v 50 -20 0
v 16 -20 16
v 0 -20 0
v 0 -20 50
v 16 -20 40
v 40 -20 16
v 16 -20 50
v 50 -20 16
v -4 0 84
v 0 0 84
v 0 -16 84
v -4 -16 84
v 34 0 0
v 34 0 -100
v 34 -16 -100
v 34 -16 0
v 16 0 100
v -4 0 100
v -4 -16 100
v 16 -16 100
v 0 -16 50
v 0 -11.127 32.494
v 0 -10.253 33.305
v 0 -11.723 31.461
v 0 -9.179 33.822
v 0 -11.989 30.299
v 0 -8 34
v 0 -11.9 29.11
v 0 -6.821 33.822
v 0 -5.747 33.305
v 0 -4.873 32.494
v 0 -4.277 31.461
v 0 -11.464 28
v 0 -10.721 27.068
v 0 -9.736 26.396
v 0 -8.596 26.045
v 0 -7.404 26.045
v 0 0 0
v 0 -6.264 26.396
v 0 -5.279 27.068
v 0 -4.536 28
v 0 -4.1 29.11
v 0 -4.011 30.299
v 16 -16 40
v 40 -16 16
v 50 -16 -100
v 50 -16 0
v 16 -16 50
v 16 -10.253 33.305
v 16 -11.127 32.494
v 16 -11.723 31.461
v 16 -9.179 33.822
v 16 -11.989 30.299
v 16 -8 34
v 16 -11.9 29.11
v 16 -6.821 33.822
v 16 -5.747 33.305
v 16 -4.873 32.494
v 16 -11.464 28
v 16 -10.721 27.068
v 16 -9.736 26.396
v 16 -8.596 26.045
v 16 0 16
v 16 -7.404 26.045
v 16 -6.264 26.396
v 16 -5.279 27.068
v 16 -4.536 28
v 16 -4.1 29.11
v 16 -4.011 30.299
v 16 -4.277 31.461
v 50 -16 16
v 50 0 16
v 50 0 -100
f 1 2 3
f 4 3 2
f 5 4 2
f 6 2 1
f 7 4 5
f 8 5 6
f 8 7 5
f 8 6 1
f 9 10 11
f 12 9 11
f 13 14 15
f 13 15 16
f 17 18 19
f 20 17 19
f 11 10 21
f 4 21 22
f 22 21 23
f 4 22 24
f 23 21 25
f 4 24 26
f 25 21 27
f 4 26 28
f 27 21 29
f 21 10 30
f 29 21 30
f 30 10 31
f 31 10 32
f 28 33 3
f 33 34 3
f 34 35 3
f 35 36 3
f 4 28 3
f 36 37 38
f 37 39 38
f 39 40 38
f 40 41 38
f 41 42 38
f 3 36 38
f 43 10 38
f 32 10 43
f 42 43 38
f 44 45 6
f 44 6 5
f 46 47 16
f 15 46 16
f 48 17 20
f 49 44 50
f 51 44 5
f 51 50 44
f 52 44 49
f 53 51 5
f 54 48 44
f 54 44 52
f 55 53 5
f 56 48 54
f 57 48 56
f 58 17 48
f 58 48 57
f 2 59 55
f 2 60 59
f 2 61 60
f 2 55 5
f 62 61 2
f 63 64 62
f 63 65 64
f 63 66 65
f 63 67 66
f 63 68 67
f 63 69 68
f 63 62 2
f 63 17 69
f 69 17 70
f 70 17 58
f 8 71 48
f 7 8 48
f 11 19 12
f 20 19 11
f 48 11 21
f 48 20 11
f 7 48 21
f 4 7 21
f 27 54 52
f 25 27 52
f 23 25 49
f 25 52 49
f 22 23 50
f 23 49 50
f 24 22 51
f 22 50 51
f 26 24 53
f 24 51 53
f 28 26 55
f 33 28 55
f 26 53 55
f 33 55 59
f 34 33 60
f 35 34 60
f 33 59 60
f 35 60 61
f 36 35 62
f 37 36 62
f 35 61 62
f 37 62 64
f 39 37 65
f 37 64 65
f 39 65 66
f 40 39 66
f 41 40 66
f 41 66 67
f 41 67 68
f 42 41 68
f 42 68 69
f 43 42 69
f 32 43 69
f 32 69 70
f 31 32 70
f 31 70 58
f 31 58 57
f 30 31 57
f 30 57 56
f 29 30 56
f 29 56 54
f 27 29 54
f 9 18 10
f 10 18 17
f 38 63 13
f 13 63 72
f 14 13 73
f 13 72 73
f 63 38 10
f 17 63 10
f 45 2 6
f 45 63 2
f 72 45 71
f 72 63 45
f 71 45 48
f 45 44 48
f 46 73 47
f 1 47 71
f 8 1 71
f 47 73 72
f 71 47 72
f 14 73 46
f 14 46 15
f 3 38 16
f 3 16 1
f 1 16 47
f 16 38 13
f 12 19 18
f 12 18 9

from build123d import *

# Parameters (mm, degrees)
PAD_DEPTH    = 16
PAD001_DEPTH = 4
SKETCH002_R  = 4
POCKET_DEPTH = 16.001
SKETCH003_W  = 16
SKETCH003_H  = 16
PAD002_DEPTH = 4


with BuildPart() as part:
    # Sketch → Pad (new body)
    with BuildSketch(Plane.XZ):
        Polygon((0, 0), (0, 100), (16, 100), (16, 16), (50, 16), (50, -100), (34, -100), (34, 0), align=None)
    extrude(amount=PAD_DEPTH)

    # Sketch001 (on Face10 of Pad) → Pad001 (join)
    with BuildSketch(Plane.XZ.offset(16)):
        Polygon((0, 0), (50, 0), (50, 16), (16, 50), (0, 50), align=None)
        Polygon((16, 16), (40, 16), (16, 40), align=None, mode=Mode.SUBTRACT)
    extrude(amount=PAD001_DEPTH)

    # Sketch002 (on Face14 of Pad001) → Pocket (cut, through all)
    with BuildSketch(Plane(origin=(16, 0, 0), x_dir=(0, 0, 1), z_dir=(1, 0, 0))):
        with Locations((30, 8)):
            Circle(SKETCH002_R)
    extrude(amount=-POCKET_DEPTH, mode=Mode.SUBTRACT)

    # Sketch003 (on Face2 of Pocket) → Pad002 (join)
    with BuildSketch(Plane(origin=(0, 0, 0), x_dir=(0, 0, -1), z_dir=(-1, 0, 0))):
        with Locations((-92, 8)):
            Rectangle(SKETCH003_W, SKETCH003_H)
    extrude(amount=PAD002_DEPTH)


solid = part.part
